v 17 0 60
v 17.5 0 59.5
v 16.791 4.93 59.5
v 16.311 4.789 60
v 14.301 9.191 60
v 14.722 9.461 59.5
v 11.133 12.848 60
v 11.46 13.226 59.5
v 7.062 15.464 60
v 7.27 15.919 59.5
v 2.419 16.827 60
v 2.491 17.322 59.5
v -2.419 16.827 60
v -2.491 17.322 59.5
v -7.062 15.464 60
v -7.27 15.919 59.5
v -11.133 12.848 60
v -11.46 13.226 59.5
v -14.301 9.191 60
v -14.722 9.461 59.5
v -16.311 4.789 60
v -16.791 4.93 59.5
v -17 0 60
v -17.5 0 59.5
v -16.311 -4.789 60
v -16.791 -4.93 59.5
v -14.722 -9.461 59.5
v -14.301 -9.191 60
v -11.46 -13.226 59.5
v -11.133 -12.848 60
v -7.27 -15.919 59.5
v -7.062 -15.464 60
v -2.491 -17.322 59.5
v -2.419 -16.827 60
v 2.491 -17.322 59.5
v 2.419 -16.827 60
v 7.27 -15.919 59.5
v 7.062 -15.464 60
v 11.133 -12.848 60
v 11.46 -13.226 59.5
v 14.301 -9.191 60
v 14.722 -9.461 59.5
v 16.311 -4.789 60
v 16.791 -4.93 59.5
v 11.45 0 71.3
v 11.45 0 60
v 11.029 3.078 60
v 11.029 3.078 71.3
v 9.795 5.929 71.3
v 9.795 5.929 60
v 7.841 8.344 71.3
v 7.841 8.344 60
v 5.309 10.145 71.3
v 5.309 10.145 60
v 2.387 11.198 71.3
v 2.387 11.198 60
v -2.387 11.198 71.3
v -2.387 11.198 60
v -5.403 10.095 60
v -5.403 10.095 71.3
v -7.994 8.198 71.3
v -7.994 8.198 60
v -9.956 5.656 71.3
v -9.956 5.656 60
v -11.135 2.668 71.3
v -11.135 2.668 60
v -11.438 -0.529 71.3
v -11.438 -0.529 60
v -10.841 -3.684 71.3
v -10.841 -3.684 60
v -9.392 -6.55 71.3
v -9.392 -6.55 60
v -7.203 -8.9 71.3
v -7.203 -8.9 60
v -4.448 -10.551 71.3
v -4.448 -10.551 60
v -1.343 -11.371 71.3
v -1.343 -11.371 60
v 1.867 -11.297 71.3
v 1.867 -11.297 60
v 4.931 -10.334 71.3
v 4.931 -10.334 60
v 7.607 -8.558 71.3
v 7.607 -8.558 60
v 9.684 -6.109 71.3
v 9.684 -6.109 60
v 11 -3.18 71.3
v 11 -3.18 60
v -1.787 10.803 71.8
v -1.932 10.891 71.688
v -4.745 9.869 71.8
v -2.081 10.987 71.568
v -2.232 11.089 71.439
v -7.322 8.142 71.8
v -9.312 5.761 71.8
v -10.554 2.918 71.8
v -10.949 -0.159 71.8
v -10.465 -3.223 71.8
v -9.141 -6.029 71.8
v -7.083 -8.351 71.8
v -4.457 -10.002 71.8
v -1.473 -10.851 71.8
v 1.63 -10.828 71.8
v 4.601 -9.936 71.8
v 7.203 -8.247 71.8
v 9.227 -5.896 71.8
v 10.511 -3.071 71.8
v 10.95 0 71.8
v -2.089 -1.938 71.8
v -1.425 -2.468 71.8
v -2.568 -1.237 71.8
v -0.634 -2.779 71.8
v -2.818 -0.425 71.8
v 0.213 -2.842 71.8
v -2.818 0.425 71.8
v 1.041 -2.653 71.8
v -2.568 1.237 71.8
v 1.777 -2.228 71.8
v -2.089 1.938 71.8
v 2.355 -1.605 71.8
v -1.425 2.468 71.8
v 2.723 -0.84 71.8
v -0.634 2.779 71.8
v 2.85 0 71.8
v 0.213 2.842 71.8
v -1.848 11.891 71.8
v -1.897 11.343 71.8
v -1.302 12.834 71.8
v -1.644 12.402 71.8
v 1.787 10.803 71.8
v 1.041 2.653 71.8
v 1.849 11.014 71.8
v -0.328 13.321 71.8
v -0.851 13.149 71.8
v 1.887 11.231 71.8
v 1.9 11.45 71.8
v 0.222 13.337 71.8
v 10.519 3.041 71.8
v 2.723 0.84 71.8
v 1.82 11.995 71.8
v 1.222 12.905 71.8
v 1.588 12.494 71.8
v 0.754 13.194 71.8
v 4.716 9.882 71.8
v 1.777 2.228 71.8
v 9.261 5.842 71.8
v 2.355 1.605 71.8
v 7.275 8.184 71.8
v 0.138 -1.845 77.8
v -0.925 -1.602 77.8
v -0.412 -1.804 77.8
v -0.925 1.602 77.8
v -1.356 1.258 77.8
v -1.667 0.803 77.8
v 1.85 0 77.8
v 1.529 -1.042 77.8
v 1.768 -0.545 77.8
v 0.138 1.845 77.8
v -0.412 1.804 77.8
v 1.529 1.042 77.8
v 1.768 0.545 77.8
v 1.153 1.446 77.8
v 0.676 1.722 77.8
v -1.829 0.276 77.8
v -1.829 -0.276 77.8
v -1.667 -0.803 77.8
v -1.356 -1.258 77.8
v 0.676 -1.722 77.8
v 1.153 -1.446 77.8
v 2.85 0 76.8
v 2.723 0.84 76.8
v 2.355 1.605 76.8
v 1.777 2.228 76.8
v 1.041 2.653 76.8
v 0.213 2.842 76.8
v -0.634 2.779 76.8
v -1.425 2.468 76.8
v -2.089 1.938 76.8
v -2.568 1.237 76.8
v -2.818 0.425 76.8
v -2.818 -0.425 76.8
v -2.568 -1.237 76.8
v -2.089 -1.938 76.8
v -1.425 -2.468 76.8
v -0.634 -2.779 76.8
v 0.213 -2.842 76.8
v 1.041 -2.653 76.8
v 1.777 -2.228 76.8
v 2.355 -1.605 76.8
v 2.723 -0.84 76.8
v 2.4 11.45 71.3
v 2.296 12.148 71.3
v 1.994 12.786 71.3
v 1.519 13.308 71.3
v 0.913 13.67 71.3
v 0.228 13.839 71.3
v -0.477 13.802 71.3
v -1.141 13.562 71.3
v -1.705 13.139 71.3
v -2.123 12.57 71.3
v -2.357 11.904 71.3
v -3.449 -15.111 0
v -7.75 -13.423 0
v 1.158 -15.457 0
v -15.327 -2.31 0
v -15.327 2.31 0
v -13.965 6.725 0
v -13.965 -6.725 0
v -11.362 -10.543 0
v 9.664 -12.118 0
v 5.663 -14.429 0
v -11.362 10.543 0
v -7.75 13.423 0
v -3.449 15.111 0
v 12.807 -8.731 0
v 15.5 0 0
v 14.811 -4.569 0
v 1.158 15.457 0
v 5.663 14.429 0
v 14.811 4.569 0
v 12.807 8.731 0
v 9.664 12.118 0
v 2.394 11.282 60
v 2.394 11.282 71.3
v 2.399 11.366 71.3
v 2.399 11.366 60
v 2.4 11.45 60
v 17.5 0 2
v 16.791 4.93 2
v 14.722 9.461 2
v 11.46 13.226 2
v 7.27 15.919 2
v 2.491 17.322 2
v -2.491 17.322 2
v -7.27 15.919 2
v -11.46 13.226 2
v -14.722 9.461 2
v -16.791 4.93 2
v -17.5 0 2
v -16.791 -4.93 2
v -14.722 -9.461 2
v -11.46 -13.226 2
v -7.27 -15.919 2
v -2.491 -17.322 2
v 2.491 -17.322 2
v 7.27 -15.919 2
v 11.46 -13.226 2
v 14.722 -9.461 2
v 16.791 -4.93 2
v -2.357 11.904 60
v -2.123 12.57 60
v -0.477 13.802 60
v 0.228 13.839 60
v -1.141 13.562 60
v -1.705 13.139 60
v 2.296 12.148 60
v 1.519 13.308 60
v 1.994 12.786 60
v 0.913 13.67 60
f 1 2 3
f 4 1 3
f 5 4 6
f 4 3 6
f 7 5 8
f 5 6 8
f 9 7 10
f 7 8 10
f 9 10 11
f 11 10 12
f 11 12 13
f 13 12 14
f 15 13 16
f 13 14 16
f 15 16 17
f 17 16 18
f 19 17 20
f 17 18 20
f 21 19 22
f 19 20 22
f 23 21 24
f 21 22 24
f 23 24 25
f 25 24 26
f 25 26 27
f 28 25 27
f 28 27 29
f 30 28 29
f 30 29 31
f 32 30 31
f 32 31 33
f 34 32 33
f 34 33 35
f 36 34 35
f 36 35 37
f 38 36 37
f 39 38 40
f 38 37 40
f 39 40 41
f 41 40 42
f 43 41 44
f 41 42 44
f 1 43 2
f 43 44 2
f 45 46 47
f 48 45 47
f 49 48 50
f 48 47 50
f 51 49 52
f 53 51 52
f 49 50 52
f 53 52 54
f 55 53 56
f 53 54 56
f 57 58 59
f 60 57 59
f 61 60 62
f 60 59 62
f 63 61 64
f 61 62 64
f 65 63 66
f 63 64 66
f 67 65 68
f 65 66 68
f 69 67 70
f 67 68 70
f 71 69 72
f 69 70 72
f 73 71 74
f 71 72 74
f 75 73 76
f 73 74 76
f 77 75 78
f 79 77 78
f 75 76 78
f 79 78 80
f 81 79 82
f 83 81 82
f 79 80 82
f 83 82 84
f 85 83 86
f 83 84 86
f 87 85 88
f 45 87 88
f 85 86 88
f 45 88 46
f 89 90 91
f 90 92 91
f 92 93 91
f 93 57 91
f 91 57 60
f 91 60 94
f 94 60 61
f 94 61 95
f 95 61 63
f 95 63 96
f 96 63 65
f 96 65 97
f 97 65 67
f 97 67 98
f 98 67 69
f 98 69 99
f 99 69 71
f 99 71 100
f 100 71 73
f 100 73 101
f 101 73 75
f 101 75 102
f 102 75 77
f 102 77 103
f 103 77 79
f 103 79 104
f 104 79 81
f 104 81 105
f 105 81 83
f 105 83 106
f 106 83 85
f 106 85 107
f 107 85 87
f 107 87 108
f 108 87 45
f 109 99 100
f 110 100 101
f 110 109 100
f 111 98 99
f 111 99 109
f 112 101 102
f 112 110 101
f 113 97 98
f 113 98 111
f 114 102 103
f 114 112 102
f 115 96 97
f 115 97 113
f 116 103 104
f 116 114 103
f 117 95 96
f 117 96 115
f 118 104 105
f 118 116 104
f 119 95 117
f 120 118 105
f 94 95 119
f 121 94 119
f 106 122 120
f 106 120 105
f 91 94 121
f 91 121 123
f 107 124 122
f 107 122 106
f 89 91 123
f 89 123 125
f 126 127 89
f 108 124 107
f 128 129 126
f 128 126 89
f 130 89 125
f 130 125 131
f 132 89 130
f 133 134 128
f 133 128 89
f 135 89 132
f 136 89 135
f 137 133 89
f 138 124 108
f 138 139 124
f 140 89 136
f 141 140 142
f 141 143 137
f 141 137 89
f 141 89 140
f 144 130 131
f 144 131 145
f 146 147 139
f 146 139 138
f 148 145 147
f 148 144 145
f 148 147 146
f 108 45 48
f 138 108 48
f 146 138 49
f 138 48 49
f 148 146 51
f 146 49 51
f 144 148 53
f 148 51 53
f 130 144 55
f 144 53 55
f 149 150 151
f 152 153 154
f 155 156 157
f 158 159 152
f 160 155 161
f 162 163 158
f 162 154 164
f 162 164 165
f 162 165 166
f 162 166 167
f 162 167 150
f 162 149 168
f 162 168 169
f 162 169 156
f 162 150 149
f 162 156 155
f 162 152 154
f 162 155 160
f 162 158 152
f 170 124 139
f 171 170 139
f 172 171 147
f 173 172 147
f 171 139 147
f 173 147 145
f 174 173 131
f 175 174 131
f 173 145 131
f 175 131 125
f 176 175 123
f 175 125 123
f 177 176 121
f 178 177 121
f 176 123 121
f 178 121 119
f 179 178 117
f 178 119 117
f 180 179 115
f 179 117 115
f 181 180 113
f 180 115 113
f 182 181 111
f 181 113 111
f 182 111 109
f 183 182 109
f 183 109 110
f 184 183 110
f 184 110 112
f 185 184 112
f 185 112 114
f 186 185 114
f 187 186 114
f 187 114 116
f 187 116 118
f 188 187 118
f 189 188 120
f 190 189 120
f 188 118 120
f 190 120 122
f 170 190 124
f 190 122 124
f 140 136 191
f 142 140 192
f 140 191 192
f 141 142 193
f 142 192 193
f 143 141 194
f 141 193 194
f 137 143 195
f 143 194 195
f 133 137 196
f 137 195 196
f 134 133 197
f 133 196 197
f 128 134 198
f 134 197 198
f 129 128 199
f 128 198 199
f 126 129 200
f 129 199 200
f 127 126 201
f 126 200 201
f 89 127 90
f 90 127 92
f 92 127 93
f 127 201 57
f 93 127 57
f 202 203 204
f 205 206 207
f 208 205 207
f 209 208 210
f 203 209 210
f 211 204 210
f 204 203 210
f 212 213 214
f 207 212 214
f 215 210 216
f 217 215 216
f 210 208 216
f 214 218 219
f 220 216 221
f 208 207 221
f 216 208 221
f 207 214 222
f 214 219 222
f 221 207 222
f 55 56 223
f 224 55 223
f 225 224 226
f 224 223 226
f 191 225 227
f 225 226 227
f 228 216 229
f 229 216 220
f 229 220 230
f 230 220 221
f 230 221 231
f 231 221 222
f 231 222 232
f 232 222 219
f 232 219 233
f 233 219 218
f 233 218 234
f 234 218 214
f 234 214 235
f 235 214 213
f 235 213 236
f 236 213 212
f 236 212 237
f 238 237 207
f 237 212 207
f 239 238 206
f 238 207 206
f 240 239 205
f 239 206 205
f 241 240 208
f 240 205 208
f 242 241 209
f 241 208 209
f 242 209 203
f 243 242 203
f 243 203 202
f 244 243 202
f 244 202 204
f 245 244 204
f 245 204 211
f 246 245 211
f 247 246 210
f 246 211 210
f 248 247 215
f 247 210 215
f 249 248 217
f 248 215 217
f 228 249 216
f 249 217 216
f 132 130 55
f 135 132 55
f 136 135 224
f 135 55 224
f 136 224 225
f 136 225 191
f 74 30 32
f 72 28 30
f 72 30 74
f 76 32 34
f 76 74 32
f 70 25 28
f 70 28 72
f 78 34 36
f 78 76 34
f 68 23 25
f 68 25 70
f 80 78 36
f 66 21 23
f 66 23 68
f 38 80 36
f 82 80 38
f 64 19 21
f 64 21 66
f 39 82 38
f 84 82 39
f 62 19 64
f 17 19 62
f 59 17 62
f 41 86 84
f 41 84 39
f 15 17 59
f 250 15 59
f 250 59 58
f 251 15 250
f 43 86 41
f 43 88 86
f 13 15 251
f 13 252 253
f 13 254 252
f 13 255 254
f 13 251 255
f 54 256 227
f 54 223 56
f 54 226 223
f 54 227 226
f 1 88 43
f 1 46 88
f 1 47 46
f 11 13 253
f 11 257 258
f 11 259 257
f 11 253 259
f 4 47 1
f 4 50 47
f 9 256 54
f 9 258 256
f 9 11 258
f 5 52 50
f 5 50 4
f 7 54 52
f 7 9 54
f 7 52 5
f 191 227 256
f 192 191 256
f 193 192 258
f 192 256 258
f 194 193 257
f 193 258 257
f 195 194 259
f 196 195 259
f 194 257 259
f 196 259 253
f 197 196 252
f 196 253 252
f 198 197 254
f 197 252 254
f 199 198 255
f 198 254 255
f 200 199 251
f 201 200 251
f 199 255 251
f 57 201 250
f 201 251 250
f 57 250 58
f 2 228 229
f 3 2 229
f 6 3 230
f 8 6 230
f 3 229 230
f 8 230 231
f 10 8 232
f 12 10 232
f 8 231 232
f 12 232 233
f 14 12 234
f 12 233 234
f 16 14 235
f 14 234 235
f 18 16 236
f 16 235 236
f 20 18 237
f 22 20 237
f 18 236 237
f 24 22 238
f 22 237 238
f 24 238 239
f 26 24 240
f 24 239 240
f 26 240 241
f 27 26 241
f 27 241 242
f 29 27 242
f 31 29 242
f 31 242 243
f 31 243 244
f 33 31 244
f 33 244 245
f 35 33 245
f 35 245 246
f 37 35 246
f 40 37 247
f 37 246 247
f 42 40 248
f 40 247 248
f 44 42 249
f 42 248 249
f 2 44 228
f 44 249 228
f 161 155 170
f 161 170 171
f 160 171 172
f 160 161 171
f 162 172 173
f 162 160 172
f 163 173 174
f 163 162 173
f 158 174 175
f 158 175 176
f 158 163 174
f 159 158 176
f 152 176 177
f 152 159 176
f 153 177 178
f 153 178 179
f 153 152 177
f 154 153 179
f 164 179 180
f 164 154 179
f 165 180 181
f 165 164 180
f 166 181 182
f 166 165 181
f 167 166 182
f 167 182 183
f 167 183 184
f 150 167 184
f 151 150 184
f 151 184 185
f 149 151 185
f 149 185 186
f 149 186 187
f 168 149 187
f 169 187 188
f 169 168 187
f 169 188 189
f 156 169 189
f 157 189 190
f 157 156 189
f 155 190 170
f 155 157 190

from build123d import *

# Parameters (mm, degrees)
F0_R     = 17.5
F1_DEPTH = 60
F3_DEPTH = 11.8
F4_R     = 2.85
F5_DEPTH = 6
F6_SIZE  = 1
F7_SIZE  = 0.5
F8_SIZE  = 2


with BuildPart() as f1:
    # F0 (on Top) → F1 (new body)
    with BuildSketch(Plane.XY):
        Circle(F0_R)
    extrude(amount=F1_DEPTH)

    # F2 (on face) → F3 (join)
    with BuildSketch(Plane.XY.offset(60)):
        with BuildLine():
            ThreePointArc((-2.3867830802, 11.1984716157), (-7.2032573788, -8.9003136537), (11.45, 0))
            ThreePointArc((11.45, 0), (8.9003136537, 7.2032573788), (2.3867830802, 11.1984716157))
            ThreePointArc((2.3867830802, 11.1984716157), (0, 9.05), (-2.3867830802, 11.1984716157))
        make_face()
        with BuildLine():
            ThreePointArc((-2.3867830802, 11.1984716157), (0, 9.05), (2.3867830802, 11.1984716157))
            ThreePointArc((2.3867830802, 11.1984716157), (0, 11.45), (-2.3867830802, 11.1984716157))
        make_face()
        with BuildLine():
            ThreePointArc((-2.3867830802, 11.1984716157), (0, 11.45), (2.3867830802, 11.1984716157))
            ThreePointArc((2.3867830802, 11.1984716157), (2.3966934923, 11.324062302), (2.4, 11.45))
            ThreePointArc((2.4, 11.45), (-0.125937698, 13.8466934923), (-2.3867830802, 11.1984716157))
        make_face()
    extrude(amount=F3_DEPTH)

    # F4 (on face) → F5 (join)
    with BuildSketch(Plane.XY.offset(71.8)):
        Circle(F4_R)
    extrude(amount=F5_DEPTH)

    # F6
    f6_edges = [f1.edges().sort_by_distance(p)[0] for p in [
        (-2.85, 0, 77.8),
    ]]
    chamfer(f6_edges, length=F6_SIZE)

    # F7
    f7_edges = [f1.edges().sort_by_distance(p)[0] for p in [
        (0, -11.45, 71.8),
        (0, 13.85, 71.8),
        (-17.5, 0, 60),
    ]]
    chamfer(f7_edges, length=F7_SIZE)

    # F8
    f8_edges = [f1.edges().sort_by_distance(p)[0] for p in [
        (-17.5, 0, 0),
    ]]
    chamfer(f8_edges, length=F8_SIZE)


solid = f1.part
